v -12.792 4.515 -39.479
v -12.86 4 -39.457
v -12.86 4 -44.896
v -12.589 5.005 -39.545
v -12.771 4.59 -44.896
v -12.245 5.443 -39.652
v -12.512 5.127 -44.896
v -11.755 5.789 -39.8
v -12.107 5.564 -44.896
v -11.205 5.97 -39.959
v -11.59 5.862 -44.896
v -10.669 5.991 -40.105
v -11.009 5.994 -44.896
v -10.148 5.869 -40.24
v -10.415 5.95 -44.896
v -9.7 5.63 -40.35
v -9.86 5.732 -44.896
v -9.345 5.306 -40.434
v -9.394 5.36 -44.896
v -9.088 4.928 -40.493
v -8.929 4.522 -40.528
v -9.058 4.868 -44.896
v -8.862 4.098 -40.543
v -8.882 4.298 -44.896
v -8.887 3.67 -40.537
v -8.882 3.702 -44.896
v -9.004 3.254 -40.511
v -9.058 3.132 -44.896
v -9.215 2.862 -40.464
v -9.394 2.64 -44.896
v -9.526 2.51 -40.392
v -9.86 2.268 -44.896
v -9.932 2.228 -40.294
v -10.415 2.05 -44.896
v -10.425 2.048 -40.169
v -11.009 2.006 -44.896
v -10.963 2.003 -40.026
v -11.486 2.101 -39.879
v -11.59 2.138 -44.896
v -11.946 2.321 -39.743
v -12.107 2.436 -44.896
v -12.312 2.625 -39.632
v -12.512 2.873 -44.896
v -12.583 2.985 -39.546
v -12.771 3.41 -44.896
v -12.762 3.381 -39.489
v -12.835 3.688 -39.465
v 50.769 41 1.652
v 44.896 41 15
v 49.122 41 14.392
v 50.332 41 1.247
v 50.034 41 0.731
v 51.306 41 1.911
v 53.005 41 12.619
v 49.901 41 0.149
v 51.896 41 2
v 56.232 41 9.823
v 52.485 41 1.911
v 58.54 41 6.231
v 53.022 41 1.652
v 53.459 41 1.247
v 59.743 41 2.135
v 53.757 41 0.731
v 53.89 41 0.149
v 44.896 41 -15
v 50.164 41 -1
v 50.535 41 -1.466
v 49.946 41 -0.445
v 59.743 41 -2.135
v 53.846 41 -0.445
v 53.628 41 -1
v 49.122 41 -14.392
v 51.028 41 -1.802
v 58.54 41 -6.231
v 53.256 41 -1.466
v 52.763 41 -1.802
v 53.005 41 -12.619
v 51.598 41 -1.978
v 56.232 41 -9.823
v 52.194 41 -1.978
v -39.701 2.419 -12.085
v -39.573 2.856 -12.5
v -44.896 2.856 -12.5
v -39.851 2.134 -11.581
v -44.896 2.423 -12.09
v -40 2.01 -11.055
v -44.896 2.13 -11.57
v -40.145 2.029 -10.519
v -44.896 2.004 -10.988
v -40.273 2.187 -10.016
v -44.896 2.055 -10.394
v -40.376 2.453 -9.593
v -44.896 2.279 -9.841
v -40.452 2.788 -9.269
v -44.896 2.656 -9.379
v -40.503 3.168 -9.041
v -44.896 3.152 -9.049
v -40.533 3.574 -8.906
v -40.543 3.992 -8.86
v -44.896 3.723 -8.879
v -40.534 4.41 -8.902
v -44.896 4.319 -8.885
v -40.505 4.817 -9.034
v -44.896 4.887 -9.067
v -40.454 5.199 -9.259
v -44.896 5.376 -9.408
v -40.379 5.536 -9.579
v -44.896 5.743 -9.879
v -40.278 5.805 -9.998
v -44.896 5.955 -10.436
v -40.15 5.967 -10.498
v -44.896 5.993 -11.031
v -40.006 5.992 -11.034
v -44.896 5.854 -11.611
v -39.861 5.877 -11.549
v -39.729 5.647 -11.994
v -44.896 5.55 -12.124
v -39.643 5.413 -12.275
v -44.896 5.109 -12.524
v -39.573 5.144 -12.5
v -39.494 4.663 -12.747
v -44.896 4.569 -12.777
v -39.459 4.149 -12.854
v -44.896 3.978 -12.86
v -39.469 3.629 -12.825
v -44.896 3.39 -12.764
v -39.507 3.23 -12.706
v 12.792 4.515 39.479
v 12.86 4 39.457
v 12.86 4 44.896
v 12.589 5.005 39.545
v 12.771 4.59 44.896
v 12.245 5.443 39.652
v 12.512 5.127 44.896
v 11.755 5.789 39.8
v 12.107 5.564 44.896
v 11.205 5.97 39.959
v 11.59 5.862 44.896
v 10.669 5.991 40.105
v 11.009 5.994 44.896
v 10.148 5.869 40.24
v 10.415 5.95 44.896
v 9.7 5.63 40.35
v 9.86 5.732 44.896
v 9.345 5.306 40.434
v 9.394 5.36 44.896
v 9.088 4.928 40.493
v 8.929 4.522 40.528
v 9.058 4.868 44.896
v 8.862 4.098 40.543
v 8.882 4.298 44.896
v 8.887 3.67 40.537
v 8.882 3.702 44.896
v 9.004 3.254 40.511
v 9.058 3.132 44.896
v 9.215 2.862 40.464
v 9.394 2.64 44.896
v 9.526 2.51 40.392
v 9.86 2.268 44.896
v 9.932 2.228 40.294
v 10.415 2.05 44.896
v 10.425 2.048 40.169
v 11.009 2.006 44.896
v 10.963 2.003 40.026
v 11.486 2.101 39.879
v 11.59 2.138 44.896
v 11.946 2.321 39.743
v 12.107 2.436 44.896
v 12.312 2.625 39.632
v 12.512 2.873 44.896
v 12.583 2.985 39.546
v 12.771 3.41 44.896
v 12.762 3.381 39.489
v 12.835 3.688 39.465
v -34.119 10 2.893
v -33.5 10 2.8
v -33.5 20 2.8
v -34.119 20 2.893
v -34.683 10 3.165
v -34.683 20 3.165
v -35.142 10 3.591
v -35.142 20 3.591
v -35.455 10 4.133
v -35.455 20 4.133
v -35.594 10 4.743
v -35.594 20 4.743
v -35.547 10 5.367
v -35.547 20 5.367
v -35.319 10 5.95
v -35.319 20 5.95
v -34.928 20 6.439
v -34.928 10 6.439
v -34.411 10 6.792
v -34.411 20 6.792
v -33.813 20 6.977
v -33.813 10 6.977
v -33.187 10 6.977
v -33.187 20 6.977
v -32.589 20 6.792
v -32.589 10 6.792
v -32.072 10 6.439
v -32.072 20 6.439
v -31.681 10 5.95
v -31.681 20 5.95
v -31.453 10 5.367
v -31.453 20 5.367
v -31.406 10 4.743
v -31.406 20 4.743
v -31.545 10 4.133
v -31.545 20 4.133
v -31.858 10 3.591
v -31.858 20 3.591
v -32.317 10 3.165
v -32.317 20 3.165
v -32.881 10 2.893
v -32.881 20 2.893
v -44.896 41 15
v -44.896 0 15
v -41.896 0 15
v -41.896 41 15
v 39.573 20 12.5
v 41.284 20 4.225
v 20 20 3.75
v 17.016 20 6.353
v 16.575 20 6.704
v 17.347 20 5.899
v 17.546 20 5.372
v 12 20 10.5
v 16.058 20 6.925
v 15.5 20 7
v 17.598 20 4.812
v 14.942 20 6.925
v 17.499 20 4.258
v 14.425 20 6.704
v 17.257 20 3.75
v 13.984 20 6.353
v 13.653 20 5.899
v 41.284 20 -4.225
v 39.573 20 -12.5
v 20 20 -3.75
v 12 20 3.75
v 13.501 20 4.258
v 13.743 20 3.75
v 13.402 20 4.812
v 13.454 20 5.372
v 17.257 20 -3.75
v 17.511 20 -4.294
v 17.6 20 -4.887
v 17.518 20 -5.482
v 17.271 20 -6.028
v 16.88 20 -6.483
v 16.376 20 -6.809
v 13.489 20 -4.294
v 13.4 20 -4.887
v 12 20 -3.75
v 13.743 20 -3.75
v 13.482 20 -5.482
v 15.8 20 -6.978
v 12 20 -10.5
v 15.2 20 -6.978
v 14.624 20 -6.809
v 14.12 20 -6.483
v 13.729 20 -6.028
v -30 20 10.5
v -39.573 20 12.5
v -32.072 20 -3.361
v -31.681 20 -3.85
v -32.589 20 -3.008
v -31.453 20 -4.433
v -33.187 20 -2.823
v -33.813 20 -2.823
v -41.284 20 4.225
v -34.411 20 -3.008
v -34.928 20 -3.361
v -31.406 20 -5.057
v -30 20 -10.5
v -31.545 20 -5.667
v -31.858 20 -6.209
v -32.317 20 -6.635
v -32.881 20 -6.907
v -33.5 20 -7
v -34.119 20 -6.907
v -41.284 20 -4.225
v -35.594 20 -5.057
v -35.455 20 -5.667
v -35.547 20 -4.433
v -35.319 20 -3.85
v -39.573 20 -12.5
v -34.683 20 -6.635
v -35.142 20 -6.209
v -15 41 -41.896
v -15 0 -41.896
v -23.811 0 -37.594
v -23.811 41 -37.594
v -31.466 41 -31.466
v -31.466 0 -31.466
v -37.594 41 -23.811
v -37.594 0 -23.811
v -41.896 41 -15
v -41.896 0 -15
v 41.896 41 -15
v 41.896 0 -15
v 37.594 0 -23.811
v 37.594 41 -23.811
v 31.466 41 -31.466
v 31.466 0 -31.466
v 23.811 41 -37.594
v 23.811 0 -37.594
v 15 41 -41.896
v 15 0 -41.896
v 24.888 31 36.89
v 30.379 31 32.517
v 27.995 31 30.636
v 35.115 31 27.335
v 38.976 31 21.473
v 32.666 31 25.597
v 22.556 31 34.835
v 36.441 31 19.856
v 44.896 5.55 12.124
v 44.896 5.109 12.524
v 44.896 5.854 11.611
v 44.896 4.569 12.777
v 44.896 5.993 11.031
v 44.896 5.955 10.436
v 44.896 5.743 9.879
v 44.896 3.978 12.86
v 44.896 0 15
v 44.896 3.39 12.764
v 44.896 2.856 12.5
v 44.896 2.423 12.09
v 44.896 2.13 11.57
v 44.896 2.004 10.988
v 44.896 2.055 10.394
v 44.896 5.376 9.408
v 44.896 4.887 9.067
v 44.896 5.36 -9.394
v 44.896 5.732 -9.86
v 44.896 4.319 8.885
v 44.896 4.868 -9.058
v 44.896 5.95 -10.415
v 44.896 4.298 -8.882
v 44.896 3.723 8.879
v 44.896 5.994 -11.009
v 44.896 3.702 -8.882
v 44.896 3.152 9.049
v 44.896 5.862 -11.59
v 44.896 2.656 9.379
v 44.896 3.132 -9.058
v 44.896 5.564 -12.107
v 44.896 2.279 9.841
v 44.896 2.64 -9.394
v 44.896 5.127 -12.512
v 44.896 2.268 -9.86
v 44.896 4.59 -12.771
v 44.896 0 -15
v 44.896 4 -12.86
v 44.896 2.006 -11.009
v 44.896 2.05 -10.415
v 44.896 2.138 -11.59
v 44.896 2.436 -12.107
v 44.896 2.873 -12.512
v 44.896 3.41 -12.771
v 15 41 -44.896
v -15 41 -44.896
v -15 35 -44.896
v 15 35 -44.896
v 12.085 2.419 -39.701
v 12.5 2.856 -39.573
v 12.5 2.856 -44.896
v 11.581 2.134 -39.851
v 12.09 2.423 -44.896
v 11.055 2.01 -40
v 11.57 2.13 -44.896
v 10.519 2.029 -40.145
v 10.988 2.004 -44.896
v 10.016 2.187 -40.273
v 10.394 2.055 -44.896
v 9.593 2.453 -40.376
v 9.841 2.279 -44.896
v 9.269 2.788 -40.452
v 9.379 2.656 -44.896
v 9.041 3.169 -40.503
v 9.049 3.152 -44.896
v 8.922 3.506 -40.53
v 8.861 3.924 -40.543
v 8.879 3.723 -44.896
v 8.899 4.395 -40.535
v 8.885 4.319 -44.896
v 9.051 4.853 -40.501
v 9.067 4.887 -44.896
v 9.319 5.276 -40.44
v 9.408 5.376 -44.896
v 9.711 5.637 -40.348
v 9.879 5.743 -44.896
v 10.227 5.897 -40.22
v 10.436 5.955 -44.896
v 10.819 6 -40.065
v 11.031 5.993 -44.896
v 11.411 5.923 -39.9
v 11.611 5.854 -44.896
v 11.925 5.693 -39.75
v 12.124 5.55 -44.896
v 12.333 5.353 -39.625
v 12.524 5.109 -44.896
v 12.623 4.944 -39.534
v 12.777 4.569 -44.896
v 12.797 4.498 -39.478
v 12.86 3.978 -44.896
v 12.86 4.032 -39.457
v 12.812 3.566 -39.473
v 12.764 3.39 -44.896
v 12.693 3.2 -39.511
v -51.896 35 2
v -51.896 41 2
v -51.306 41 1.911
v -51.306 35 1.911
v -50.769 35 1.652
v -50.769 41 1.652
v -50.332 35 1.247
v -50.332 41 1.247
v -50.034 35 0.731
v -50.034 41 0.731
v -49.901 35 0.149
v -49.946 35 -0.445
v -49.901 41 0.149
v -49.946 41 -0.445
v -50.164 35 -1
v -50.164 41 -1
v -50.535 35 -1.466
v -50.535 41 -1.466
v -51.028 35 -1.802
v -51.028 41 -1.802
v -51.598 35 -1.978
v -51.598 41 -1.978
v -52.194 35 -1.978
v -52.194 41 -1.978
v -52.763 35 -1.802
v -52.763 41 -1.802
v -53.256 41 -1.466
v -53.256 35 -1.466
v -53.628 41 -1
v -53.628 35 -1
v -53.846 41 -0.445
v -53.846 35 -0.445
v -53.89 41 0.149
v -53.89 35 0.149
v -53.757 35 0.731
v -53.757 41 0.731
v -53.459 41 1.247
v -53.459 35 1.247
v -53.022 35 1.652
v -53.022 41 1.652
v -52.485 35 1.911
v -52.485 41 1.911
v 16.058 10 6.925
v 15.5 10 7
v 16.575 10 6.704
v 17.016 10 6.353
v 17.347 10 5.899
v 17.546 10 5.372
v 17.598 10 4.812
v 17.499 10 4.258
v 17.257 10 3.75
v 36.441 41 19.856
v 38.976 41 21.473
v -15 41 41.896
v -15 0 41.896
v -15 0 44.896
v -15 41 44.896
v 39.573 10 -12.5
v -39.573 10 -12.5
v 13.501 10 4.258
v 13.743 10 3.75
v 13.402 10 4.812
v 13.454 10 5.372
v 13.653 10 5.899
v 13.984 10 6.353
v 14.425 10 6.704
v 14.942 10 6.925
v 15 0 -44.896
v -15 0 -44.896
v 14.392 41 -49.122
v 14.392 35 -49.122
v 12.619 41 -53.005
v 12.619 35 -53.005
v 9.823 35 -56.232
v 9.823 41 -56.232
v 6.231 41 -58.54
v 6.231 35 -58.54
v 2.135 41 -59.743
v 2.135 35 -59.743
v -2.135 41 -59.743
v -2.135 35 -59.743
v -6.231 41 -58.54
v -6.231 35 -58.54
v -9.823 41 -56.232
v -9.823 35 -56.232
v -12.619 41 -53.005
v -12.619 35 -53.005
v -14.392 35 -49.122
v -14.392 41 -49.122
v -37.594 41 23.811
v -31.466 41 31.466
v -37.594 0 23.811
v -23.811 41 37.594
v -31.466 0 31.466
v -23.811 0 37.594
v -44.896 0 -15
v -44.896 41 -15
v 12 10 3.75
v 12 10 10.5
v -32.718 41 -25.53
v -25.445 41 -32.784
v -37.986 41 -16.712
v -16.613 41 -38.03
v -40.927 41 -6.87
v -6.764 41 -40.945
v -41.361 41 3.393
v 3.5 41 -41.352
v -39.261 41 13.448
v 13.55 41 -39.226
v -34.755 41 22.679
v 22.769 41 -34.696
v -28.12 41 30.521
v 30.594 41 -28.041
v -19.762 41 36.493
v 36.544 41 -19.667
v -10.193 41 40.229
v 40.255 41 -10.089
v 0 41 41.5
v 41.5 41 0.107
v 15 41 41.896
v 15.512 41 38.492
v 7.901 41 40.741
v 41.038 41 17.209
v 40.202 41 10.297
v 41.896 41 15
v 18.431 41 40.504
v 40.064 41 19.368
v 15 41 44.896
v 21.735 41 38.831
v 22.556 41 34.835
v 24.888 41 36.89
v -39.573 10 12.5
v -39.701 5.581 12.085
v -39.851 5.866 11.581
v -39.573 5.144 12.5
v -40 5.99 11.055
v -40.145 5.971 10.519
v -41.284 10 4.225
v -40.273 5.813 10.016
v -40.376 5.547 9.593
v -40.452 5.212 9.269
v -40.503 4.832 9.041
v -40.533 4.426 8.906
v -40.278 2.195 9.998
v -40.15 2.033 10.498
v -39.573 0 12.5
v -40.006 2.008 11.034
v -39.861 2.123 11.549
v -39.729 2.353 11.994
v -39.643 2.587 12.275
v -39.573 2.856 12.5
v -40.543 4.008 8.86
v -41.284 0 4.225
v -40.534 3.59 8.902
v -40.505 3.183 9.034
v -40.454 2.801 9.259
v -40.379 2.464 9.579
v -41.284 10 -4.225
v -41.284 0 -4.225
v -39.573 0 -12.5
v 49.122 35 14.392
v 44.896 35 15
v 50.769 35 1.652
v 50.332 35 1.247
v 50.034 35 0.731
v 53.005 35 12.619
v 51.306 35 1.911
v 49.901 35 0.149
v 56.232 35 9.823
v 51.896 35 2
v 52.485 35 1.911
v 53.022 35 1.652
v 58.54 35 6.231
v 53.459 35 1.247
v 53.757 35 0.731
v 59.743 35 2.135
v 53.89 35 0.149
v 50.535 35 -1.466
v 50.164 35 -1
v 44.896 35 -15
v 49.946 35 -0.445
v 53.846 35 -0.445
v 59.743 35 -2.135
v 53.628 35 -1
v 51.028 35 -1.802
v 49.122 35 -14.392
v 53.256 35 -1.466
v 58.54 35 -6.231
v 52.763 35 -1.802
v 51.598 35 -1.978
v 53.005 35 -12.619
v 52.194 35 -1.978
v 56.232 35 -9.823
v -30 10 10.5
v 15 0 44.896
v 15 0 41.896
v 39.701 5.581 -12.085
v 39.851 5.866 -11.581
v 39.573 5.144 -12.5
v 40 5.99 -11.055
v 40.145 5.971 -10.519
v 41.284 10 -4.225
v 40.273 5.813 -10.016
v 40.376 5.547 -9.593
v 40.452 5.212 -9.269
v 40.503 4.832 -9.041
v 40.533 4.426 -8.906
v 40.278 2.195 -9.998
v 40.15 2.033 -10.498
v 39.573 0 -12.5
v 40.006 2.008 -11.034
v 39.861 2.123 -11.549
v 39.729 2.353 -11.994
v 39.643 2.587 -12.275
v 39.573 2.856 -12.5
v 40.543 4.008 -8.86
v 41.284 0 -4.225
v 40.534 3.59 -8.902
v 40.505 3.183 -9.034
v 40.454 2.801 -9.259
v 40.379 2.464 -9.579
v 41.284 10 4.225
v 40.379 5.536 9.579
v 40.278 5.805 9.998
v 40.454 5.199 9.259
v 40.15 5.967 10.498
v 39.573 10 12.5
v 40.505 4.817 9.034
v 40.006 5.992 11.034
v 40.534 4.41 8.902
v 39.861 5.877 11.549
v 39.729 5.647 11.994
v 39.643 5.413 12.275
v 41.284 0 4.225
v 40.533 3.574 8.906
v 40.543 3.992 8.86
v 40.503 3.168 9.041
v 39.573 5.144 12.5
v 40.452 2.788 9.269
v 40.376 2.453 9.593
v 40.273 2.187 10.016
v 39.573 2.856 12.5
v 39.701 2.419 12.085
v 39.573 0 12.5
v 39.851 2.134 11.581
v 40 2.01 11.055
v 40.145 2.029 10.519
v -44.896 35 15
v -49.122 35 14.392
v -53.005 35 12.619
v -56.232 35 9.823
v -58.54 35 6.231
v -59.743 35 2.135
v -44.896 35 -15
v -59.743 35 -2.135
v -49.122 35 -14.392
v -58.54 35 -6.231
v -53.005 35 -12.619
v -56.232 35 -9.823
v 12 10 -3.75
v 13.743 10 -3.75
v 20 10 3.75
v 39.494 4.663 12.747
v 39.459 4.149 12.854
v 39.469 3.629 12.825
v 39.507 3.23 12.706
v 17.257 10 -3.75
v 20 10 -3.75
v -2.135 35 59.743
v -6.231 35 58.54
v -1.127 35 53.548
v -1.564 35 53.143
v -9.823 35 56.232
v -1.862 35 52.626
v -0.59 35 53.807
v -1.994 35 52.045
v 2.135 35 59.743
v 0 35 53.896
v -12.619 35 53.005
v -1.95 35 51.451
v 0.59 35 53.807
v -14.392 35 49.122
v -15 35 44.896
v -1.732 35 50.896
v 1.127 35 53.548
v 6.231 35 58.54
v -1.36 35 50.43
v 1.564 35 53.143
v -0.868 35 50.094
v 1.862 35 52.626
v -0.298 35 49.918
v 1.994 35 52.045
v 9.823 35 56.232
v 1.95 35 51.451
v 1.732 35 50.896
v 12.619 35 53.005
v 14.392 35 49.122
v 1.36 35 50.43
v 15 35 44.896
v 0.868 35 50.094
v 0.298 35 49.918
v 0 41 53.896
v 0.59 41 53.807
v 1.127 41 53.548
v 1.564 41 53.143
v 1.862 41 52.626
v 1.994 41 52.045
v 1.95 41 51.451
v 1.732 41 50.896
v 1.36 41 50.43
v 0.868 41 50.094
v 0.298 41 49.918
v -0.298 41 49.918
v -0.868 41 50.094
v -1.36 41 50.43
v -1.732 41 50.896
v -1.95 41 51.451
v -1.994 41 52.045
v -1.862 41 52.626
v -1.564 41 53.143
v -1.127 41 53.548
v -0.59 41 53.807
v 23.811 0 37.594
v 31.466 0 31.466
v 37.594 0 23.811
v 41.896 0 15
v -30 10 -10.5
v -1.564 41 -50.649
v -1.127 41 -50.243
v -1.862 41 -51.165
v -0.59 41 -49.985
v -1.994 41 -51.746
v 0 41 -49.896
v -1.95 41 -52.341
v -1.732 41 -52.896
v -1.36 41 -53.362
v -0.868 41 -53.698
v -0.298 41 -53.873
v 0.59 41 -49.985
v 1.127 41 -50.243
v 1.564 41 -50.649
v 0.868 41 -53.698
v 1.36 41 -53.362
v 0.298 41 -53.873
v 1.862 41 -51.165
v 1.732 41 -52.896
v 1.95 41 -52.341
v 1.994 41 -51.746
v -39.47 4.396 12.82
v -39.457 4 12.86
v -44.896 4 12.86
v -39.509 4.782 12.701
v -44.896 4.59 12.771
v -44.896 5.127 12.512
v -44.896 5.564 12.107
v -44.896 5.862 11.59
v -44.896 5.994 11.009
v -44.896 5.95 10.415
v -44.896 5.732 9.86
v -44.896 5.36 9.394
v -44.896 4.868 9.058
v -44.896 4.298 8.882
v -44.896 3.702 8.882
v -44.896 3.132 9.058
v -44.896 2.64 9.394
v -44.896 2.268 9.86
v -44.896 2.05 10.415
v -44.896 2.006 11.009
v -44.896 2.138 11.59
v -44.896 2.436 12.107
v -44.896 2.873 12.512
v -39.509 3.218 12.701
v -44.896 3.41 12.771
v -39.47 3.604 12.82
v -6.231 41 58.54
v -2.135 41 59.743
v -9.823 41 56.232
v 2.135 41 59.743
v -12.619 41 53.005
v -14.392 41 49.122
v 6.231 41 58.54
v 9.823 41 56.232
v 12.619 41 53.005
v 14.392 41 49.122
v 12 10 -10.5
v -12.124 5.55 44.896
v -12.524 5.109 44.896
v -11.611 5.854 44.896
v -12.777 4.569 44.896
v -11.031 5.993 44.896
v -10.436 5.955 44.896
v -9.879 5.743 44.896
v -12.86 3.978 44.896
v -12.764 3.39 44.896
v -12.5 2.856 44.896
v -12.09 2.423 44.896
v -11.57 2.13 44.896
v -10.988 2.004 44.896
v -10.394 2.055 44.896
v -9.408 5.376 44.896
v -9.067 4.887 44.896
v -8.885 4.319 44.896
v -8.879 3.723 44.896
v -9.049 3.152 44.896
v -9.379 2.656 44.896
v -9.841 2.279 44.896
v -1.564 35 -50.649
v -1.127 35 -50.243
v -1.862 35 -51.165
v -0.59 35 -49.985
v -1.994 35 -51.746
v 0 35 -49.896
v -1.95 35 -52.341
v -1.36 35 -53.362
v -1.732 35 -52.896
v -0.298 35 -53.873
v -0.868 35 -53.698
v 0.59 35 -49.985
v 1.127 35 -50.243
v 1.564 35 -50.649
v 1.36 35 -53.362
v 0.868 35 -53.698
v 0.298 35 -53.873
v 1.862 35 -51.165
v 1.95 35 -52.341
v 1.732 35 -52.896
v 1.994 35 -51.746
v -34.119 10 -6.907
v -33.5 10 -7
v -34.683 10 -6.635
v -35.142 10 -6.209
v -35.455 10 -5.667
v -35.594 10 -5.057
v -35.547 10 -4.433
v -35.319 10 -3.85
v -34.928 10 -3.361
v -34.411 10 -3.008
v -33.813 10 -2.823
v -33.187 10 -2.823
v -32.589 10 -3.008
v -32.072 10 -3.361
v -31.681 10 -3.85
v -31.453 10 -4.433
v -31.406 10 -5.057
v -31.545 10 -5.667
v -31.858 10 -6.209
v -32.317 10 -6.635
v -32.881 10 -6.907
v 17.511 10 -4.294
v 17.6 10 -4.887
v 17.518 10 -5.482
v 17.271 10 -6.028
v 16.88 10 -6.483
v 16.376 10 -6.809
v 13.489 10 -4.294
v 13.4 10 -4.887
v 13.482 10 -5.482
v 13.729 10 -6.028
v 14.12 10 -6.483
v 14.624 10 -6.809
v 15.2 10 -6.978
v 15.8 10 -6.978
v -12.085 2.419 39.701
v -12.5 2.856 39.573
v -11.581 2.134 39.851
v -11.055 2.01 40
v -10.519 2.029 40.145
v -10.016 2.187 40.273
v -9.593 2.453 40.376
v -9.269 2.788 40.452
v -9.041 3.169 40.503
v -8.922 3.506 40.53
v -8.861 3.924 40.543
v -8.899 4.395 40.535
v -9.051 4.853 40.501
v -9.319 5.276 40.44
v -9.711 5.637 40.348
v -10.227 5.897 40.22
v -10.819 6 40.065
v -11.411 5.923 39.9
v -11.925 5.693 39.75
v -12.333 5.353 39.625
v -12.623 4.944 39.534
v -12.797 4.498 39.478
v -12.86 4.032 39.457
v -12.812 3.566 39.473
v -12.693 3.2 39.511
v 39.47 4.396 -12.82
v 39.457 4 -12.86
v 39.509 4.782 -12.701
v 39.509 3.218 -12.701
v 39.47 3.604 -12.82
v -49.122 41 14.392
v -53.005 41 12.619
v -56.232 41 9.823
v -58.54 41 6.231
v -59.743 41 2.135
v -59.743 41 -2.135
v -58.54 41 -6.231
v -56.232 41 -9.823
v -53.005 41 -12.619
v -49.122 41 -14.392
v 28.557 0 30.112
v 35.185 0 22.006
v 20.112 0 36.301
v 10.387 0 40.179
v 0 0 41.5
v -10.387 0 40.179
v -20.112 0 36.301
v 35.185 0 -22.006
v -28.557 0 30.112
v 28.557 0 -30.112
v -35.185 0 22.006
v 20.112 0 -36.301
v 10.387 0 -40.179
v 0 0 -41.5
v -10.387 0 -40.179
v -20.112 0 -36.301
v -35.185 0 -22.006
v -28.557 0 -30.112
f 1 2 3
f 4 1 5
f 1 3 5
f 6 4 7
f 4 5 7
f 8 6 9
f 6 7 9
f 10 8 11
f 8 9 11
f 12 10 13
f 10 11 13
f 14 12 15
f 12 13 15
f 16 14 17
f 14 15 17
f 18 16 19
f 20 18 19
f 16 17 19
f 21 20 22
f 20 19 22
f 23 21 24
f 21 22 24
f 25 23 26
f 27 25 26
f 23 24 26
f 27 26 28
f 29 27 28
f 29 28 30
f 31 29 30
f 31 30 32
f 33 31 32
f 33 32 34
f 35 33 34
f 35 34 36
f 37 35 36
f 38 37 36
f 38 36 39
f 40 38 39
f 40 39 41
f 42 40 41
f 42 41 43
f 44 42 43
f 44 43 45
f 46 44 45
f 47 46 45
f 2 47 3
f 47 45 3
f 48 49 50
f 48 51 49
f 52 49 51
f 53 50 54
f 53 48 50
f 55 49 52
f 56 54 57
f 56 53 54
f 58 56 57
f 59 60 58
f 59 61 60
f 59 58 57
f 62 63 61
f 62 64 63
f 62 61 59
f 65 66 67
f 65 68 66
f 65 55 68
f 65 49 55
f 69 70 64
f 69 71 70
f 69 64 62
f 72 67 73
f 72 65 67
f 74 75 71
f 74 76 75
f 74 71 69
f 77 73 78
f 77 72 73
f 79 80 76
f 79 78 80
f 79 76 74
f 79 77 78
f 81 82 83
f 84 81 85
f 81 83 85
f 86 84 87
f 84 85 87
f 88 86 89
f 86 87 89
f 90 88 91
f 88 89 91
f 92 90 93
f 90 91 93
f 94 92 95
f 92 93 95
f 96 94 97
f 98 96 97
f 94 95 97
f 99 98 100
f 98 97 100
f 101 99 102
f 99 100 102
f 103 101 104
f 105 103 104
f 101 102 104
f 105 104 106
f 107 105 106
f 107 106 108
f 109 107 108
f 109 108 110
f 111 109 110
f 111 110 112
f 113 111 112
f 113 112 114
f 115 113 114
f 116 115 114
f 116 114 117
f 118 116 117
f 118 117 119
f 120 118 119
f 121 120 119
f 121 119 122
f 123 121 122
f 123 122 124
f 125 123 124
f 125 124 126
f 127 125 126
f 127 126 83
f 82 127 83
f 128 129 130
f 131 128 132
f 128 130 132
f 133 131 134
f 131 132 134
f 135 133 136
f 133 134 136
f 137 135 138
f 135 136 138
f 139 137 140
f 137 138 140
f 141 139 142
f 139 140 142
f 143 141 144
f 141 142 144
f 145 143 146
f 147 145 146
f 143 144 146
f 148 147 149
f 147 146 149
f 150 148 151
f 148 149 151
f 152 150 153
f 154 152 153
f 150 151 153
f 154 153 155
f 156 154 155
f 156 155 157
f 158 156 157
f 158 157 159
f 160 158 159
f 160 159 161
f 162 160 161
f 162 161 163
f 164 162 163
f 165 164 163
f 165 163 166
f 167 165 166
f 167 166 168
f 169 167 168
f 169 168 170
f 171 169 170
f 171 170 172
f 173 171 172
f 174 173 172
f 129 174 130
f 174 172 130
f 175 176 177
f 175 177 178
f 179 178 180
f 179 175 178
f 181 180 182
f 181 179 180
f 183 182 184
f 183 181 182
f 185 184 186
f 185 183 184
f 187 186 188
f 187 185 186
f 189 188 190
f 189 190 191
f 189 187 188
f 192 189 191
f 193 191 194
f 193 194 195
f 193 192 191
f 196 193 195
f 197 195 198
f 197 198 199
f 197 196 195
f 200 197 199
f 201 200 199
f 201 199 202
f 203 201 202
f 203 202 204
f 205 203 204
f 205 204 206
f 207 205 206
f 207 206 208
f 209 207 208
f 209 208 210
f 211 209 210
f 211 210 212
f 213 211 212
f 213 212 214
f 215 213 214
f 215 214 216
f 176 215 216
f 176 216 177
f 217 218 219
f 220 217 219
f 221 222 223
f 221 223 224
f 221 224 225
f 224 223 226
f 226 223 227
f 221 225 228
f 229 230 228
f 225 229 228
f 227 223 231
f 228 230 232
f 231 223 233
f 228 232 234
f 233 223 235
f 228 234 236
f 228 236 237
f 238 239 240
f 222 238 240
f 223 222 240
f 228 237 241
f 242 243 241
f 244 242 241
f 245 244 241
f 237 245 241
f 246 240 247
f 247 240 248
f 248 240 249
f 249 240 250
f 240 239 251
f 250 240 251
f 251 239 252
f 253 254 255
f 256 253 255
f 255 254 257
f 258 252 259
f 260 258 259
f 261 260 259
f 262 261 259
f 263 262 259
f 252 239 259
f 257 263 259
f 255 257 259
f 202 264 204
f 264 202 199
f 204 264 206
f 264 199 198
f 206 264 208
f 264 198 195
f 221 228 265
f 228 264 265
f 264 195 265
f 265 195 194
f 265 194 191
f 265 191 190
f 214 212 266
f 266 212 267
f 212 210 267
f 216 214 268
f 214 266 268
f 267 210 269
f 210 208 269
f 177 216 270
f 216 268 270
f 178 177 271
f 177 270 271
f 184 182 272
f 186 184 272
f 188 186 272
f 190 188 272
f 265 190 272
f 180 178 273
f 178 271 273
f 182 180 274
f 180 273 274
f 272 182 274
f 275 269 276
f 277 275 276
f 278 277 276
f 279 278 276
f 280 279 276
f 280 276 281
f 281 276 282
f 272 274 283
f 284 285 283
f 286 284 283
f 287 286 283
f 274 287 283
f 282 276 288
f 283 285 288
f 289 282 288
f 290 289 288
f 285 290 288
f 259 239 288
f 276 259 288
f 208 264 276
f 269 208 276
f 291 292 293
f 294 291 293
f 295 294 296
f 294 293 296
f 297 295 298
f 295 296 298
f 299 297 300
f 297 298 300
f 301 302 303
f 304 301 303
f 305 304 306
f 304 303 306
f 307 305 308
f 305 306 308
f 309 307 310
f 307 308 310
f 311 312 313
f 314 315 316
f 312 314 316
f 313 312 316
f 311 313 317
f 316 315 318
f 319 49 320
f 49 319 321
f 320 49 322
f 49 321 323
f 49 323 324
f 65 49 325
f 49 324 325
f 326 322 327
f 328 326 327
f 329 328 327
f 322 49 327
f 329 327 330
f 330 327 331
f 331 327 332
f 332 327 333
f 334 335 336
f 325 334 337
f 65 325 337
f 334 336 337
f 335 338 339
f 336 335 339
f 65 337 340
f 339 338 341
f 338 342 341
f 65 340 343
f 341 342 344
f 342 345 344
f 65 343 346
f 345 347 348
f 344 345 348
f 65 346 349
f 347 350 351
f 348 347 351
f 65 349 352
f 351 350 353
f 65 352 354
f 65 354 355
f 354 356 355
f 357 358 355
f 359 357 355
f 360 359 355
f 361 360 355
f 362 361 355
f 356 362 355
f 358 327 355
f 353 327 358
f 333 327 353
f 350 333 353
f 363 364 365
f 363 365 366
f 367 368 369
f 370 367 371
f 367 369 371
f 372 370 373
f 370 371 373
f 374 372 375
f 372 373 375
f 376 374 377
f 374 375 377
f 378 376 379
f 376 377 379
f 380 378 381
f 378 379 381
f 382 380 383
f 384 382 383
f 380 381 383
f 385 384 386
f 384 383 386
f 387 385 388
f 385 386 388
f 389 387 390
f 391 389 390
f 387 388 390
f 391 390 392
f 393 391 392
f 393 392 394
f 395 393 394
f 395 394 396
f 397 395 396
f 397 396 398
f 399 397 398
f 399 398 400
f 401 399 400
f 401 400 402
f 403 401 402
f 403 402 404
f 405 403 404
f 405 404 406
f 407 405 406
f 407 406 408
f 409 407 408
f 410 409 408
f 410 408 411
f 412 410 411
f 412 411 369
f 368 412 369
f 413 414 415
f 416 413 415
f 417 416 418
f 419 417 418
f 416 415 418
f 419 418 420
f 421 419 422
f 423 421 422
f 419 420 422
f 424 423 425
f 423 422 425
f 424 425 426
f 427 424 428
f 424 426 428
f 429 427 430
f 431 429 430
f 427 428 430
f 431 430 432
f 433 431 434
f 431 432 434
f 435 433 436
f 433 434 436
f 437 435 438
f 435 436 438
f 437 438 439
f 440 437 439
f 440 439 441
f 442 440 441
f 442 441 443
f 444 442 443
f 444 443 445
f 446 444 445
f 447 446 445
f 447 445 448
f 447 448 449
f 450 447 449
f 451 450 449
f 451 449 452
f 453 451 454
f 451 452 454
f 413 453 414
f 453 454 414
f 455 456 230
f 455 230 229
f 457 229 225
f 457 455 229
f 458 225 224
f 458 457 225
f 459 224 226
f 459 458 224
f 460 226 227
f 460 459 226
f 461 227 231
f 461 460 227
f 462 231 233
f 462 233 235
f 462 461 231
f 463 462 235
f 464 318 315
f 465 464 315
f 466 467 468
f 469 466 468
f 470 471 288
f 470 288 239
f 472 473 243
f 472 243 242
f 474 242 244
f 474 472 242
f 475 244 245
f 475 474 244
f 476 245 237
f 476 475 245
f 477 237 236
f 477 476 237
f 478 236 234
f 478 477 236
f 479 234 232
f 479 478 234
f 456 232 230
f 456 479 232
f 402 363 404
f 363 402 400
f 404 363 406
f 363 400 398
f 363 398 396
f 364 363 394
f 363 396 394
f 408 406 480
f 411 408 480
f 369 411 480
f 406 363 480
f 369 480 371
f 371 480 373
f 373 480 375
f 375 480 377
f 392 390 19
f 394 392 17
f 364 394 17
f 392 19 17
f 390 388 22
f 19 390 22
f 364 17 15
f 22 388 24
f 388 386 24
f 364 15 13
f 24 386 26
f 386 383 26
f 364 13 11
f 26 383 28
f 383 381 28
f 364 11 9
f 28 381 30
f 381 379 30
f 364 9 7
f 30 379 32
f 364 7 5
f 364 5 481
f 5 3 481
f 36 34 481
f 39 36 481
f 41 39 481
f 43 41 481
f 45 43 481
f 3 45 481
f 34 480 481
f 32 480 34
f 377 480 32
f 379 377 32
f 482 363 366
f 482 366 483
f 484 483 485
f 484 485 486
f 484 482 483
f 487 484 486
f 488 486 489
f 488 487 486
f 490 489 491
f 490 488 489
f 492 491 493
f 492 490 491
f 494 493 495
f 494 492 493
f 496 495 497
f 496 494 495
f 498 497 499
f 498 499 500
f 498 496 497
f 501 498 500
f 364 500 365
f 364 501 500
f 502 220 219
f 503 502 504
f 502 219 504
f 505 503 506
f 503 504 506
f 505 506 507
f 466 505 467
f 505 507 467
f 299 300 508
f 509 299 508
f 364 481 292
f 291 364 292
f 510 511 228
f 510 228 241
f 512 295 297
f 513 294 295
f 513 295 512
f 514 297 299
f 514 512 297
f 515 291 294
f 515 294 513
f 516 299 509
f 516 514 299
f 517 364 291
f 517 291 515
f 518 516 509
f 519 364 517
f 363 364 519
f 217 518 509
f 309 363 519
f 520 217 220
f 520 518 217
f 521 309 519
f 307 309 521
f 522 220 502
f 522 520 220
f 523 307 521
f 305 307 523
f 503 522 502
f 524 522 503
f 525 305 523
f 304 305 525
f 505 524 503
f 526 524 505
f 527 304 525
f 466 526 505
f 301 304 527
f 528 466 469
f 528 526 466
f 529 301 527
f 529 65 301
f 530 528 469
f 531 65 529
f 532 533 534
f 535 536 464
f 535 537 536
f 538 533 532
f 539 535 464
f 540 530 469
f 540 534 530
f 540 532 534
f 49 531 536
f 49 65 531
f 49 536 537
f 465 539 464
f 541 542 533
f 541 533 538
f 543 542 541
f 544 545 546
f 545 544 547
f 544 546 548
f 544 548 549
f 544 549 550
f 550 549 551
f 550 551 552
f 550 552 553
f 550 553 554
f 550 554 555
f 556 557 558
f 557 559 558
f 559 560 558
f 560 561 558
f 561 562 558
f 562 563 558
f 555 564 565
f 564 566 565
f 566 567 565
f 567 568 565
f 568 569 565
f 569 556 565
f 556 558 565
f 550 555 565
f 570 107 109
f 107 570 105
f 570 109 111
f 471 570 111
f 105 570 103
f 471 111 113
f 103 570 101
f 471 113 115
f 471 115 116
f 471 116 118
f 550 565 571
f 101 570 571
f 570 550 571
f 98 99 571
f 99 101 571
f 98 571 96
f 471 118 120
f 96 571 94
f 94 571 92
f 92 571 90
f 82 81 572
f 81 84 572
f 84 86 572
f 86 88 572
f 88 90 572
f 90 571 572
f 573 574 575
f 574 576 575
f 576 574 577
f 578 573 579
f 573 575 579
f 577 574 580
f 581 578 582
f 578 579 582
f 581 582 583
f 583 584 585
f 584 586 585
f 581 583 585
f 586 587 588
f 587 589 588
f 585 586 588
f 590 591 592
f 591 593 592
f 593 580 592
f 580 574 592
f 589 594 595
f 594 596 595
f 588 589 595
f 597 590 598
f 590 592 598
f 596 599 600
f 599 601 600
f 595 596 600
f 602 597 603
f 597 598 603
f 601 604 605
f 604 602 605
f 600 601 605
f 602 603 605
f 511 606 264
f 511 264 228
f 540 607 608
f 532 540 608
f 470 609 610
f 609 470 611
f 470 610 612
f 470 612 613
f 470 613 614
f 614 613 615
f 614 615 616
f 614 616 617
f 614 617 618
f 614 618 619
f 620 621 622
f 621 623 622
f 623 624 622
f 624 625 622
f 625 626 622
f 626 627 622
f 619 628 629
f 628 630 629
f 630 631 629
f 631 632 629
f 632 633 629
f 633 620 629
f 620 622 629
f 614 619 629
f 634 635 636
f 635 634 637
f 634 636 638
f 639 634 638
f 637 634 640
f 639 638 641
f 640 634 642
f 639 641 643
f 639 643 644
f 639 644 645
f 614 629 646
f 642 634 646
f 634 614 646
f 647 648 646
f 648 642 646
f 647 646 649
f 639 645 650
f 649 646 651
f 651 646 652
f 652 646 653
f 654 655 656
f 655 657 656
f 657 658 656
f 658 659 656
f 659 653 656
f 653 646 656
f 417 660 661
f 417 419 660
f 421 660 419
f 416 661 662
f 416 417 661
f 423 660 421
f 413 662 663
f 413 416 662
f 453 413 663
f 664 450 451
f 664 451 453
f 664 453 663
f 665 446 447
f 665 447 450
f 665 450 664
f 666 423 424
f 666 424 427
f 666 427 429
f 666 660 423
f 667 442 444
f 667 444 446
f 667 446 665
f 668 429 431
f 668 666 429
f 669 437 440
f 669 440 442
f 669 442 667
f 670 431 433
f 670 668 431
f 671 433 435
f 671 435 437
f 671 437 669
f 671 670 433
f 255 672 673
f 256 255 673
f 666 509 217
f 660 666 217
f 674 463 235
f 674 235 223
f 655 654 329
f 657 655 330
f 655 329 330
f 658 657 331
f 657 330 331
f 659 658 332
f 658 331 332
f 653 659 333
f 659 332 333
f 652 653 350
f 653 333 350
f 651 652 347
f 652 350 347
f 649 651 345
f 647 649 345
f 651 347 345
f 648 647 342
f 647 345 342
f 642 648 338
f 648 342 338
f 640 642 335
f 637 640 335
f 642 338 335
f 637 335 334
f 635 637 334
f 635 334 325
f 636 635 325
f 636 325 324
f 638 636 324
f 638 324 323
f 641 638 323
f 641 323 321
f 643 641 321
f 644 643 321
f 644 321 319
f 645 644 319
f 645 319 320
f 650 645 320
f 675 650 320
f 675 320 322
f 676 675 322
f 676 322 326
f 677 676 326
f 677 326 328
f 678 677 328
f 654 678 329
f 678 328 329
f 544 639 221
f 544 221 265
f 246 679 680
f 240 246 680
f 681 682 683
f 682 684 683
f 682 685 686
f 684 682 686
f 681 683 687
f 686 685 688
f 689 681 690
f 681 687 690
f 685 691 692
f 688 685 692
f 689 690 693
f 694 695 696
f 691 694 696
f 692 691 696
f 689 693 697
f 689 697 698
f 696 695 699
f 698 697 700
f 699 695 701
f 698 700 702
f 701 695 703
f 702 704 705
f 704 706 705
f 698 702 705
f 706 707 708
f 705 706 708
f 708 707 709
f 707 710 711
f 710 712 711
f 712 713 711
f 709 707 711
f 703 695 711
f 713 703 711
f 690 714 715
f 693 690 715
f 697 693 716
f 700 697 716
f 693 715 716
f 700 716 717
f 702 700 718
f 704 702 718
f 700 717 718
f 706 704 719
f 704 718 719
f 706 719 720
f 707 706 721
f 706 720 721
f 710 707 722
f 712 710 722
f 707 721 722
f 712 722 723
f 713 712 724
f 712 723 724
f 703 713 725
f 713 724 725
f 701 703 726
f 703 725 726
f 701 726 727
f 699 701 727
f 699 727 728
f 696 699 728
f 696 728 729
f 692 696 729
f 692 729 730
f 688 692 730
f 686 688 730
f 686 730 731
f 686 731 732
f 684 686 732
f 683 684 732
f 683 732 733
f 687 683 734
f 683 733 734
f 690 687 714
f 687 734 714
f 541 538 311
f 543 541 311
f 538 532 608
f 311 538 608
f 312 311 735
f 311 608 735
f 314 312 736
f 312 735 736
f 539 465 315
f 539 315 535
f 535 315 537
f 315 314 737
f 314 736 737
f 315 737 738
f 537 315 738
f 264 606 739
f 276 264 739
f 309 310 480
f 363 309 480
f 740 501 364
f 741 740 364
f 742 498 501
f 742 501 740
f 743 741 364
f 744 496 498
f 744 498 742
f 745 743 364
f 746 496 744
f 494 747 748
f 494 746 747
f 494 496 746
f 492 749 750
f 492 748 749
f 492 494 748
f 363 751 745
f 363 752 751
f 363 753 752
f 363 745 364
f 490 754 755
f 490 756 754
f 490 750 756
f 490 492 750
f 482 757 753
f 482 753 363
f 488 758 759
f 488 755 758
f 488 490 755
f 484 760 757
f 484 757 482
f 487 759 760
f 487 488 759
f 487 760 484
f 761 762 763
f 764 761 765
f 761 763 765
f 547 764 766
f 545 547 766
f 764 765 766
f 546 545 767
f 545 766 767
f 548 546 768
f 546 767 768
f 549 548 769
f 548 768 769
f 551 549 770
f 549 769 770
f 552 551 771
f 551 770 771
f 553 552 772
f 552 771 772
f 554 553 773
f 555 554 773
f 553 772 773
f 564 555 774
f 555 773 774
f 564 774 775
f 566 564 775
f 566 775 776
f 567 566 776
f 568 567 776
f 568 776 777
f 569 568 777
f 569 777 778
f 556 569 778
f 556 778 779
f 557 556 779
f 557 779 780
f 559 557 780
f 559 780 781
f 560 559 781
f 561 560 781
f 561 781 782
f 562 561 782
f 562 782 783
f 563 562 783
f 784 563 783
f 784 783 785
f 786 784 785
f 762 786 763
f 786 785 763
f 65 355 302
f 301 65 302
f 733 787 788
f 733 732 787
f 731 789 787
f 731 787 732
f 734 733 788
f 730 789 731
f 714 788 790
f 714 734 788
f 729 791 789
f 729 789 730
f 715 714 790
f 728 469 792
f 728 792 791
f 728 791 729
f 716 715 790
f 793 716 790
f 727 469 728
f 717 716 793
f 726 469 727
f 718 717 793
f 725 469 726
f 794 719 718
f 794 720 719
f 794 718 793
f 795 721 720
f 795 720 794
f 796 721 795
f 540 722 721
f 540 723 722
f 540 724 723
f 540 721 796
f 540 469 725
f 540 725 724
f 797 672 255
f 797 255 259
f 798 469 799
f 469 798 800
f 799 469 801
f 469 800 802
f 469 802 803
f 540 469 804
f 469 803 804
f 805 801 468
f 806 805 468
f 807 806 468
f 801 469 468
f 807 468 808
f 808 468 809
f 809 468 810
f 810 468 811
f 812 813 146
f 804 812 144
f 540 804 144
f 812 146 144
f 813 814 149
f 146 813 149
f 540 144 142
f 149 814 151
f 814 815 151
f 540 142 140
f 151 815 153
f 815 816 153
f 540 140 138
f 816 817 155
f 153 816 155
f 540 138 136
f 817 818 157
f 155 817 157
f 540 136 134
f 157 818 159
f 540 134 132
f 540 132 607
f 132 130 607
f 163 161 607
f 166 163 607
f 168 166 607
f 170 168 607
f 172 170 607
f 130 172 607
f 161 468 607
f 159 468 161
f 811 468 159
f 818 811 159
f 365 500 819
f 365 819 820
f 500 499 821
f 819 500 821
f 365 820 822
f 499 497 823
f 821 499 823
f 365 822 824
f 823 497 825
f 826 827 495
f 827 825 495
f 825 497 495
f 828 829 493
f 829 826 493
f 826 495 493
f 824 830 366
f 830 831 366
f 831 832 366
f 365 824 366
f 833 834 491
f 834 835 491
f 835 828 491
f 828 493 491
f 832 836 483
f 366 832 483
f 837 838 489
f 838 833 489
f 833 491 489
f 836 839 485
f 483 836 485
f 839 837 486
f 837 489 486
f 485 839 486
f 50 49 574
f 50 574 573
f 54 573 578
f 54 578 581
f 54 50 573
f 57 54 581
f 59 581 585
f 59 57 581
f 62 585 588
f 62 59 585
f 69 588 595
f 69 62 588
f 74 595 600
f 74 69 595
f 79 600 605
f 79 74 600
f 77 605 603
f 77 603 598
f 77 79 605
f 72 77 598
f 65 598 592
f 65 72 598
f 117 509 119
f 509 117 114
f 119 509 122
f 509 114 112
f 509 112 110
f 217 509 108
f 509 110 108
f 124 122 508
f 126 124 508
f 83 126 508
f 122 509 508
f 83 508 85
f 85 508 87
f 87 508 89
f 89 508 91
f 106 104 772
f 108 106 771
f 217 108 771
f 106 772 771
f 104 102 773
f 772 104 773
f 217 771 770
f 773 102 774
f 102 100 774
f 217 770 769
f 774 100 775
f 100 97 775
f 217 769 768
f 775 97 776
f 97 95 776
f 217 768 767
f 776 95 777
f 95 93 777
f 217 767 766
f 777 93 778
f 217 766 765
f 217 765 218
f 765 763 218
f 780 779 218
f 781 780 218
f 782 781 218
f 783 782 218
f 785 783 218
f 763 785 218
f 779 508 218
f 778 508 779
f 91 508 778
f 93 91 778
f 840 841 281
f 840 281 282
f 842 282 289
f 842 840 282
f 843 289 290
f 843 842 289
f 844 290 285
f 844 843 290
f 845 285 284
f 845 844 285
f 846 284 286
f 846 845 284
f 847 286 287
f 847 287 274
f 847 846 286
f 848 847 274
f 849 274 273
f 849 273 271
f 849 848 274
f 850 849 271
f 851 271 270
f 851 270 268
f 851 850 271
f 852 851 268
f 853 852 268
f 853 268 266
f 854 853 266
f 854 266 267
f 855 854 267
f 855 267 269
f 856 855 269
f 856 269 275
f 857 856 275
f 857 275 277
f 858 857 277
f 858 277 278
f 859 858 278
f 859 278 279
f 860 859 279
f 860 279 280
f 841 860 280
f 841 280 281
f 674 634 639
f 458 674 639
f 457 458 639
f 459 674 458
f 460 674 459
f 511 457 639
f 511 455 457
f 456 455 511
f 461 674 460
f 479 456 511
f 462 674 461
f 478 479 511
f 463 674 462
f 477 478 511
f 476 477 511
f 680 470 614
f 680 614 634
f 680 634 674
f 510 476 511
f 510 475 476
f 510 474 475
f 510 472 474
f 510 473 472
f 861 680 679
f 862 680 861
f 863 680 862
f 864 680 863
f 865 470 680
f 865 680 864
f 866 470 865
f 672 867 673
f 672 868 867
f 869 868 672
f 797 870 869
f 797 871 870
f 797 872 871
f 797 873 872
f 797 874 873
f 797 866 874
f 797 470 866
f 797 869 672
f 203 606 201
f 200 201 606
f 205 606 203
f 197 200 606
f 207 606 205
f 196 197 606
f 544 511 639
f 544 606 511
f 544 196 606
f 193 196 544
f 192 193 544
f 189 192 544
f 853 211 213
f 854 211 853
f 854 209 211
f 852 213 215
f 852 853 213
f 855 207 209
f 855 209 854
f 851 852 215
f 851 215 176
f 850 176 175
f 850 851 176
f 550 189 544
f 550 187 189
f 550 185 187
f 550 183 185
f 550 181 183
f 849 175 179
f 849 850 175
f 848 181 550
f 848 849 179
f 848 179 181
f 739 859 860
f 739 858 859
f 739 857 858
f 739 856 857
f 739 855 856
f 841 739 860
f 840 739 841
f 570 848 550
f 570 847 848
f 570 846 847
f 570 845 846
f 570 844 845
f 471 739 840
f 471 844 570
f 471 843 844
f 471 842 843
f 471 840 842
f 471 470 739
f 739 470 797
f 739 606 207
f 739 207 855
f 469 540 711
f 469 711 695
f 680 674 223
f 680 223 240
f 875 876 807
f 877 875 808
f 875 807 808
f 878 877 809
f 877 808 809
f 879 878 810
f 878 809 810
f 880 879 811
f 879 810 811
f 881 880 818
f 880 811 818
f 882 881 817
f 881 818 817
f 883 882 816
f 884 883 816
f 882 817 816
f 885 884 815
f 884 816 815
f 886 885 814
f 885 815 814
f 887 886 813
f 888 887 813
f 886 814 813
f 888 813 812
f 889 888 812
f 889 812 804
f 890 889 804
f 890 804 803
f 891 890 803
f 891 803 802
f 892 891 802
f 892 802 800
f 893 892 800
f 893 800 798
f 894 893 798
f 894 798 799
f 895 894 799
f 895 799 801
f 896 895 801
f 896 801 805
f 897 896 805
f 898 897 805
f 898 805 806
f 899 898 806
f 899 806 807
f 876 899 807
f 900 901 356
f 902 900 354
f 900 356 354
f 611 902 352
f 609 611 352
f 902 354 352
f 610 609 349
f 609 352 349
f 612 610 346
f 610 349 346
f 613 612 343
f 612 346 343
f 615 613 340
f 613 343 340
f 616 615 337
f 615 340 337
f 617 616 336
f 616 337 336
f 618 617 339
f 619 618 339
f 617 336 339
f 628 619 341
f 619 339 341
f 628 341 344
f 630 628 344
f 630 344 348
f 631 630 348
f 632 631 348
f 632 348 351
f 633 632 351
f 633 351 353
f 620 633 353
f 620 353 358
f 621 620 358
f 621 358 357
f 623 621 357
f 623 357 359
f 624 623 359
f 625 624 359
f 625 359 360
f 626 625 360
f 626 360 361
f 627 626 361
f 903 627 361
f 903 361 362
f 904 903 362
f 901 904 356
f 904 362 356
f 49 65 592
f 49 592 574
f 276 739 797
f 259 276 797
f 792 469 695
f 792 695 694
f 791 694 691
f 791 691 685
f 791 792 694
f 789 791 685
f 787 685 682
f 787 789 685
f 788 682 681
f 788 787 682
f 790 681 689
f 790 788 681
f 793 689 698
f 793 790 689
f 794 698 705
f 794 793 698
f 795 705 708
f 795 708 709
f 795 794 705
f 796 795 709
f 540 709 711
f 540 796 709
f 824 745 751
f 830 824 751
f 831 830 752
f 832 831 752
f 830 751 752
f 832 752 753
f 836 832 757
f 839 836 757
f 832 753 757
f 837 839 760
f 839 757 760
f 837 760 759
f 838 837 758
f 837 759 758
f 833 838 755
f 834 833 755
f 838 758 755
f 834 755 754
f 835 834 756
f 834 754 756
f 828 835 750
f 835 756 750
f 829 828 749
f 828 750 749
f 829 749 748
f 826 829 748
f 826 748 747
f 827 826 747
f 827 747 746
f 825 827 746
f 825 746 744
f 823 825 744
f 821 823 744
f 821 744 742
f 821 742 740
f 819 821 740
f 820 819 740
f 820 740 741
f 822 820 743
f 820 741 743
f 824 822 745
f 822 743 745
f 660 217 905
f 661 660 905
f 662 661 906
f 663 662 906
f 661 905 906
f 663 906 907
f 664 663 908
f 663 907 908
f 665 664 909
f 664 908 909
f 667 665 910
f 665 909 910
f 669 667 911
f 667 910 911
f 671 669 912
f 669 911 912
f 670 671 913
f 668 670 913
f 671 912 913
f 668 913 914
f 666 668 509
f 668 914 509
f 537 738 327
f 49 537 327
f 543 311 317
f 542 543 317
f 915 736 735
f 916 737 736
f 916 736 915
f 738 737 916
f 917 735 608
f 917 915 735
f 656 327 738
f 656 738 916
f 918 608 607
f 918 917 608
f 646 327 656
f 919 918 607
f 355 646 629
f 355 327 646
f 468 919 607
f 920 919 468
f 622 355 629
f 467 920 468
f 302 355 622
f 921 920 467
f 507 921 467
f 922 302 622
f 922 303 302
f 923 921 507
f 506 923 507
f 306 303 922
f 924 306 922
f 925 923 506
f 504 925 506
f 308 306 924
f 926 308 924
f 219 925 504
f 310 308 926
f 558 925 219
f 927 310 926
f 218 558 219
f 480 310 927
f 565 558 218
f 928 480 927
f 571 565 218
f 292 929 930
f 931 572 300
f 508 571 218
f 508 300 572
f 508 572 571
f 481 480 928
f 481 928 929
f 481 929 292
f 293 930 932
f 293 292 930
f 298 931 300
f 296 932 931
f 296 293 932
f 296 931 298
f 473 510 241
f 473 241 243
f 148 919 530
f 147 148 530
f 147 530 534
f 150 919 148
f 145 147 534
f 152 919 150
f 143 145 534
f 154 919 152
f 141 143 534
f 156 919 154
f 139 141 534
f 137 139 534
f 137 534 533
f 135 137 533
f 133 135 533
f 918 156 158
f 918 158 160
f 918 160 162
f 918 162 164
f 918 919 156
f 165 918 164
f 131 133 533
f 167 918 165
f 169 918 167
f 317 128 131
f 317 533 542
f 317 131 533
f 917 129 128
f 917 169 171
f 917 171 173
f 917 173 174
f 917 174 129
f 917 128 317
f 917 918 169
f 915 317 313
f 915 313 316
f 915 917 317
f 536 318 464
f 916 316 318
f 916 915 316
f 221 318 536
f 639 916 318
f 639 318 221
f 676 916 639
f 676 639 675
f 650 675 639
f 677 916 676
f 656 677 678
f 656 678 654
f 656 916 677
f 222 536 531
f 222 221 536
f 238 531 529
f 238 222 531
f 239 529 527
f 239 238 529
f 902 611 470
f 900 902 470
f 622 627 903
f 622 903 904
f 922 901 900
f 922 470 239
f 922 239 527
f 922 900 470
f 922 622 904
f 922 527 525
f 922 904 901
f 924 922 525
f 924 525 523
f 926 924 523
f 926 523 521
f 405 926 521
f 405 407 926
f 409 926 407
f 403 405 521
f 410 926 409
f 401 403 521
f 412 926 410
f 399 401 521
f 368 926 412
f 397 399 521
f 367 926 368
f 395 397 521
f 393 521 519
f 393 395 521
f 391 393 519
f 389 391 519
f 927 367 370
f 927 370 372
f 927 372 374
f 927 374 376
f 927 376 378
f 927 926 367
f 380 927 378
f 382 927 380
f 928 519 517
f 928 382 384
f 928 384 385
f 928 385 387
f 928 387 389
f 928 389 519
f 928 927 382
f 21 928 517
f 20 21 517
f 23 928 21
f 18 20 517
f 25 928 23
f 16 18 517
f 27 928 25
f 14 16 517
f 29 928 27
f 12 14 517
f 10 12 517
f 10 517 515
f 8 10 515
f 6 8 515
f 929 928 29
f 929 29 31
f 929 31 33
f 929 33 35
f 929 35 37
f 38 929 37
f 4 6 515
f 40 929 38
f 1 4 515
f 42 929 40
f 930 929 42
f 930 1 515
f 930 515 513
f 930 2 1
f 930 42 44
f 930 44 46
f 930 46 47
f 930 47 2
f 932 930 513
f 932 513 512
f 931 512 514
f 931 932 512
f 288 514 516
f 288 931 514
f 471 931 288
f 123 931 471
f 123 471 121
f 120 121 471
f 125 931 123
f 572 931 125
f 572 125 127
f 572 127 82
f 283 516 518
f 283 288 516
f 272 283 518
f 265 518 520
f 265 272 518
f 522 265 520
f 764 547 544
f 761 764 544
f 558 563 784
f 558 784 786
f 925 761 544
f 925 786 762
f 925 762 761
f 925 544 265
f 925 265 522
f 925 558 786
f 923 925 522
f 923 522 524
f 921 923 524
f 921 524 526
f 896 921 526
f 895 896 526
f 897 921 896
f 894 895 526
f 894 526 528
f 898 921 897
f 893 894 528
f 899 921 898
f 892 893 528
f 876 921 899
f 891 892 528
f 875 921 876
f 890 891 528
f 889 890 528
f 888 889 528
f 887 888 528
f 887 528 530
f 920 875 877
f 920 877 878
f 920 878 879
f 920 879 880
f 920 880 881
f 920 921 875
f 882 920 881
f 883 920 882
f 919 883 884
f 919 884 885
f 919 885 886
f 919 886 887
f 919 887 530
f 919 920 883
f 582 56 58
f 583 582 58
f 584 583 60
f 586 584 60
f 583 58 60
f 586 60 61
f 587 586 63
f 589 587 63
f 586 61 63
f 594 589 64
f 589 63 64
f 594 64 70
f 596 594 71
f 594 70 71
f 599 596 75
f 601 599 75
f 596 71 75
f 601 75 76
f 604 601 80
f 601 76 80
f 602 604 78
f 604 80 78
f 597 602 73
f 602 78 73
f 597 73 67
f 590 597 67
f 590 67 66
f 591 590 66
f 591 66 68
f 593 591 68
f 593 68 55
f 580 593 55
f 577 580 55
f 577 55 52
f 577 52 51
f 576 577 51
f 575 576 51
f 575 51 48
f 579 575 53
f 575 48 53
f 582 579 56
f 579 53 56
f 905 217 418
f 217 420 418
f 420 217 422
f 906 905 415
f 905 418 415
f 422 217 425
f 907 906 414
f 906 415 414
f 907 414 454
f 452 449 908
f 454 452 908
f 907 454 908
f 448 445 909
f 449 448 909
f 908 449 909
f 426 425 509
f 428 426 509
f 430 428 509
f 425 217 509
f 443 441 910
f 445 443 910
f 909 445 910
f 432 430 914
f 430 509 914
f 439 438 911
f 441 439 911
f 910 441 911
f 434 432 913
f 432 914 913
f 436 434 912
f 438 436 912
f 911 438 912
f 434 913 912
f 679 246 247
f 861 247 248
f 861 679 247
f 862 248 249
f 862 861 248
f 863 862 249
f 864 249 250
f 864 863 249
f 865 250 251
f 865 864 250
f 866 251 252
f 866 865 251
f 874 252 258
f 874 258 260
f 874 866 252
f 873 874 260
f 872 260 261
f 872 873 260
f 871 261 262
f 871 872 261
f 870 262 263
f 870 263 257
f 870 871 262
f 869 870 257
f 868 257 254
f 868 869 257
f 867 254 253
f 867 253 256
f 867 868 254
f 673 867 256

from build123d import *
from build123d.topology import SkipClean

# Parameters (mm, degrees)
SKETCH1_R             = 44.5
SKETCH1_R_2           = 41.5
BOSS_EXTRUDE1_DEPTH   = 41
SKETCH2_R             = 2.1
SKETCH2_W             = 42
SKETCH2_H             = 21
BOSS_EXTRUDE2_DEPTH   = 20
BOSS_EXTRUDE3_DEPTH   = 41
CIRPATTERN1_COUNT     = 4
SKETCH4_R             = 2
CUT_EXTRUDE1_DEPTH    = 7
CUT_EXTRUDE2_DEPTH    = 10
CIRPATTERN2_COUNT     = 4
SKETCH6_R             = 2
BOSS_EXTRUDE4_DEPTH   = 6
BOSS_EXTRUDE4_2_DEPTH = 6
BOSS_EXTRUDE4_3_DEPTH = 6
BOSS_EXTRUDE4_4_DEPTH = 6
SKETCH8_W             = 8
SKETCH8_H             = 7.5
CUT_EXTRUDE3_DEPTH    = 60
CUT_EXTRUDE4_START    = -10
CUT_EXTRUDE4_DEPTH    = 10


with BuildPart() as part:
    # Sketch1 → Boss-Extrude1 (new body)
    with BuildSketch(Plane(origin=(0, 0, 0), x_dir=(1, 0, 0), z_dir=(0, 1, 0))):
        with Locations(Location((0, 0, 0), (0, 0, 270))):
            Circle(SKETCH1_R)
        with Locations(Location((0, 0, 0), (0, 0, 270))):
            Circle(SKETCH1_R_2, mode=Mode.SUBTRACT)
    extrude(amount=BOSS_EXTRUDE1_DEPTH)

    # Sketch2 → Boss-Extrude2 (add)
    with BuildSketch(Plane(origin=(0, 0, 0), x_dir=(1, 0, 0), z_dir=(0, 1, 0))):
        with BuildLine():
            Line((-39.572717875, 12.5), (39.572717875, 12.5))
            ThreePointArc((39.572717875, 12.5), (41.658434963, 0), (39.572717875, -12.5))
            Line((39.572717875, -12.5), (-39.572717875, -12.5))
            ThreePointArc((-39.572717875, -12.5), (-41.658434963, 0), (-39.572717875, 12.5))
        make_face()
        with Locations(Location((15.5, 4.9, 0), (0, 0, 270))):
            Circle(SKETCH2_R, mode=Mode.SUBTRACT)
        with Locations(Location((15.5, -4.9, 0), (0, 0, 270))):
            Circle(SKETCH2_R, mode=Mode.SUBTRACT)
        with Locations(Location((-33.5, 4.9, 0), (0, 0, 90))):
            Circle(SKETCH2_R, mode=Mode.SUBTRACT)
        with Locations(Location((-33.5, -4.9, 0), (0, 0, 90))):
            Circle(SKETCH2_R, mode=Mode.SUBTRACT)
        with Locations((-9, 0)):
            Rectangle(SKETCH2_W, SKETCH2_H, mode=Mode.SUBTRACT)
    extrude(amount=BOSS_EXTRUDE2_DEPTH)

    # Sketch3 → Boss-Extrude3 (add)
    with BuildSketch(Plane(origin=(0, 0, 0), x_dir=(1, 0, 0), z_dir=(0, 1, 0))):
        with BuildLine():
            Line((0, 44.895703837), (-15, 44.895703837))
            Line((-15, 44.895703837), (-15, 41.895703837))
            ThreePointArc((-15, 41.895703837), (0, 44.5), (15, 41.895703837))
            Line((15, 41.895703837), (15, 44.895703837))
            Line((15, 44.895703837), (0, 44.895703837))
        make_face()
    boss_extrude3 = extrude(amount=BOSS_EXTRUDE3_DEPTH)

    # CirPattern1: Boss-Extrude3 ×4 about axis
    cirpattern1_axis = Axis((0, 0, 0), (0, 1, 0))
    for i in range(1, CIRPATTERN1_COUNT):
        add(boss_extrude3.rotate(cirpattern1_axis, i * 360 / CIRPATTERN1_COUNT))

    # Sketch4 → Cut-Extrude1 (cut)
    with BuildSketch(Plane.ZY.offset(44.895703837)):
        with Locations((10.859802344, 4)):
            Circle(SKETCH4_R)
        with Locations(Location((-10.859802344, 4, 0), (0, 0, 214.905312115))):
            Circle(SKETCH4_R)
    cut_extrude1 = extrude(amount=-CUT_EXTRUDE1_DEPTH, mode=Mode.SUBTRACT)

    # Sketch5 → Cut-Extrude2 (cut)
    with SkipClean():  # the faces are left unmerged after this step: merging them gives an invalid solid
        with BuildSketch(Plane(origin=(0, 0, 0), x_dir=(1, 0, 0), z_dir=(0, 1, 0))):
            with BuildLine():
                Line((-39.572717875, 12.5), (39.572717875, 12.5))
                ThreePointArc((39.572717875, 12.5), (41.5, 0), (39.572717875, -12.5))
                Line((39.572717875, -12.5), (-39.572717875, -12.5))
                ThreePointArc((-39.572717875, -12.5), (-41.5, 0), (-39.572717875, 12.5))
            make_face()
        extrude(amount=CUT_EXTRUDE2_DEPTH, mode=Mode.SUBTRACT)

    # CirPattern2: Cut-Extrude1 ×4 about axis
    with SkipClean():  # the faces are left unmerged after this step: merging them gives an invalid solid
        cirpattern2_axis = Axis((0, 41, 0), (0, -1, 0))
        for i in range(1, CIRPATTERN2_COUNT):
            add(cut_extrude1.rotate(cirpattern2_axis, i * 360 / CIRPATTERN2_COUNT), mode=Mode.SUBTRACT)

    # Sketch8 → Cut-Extrude3 (cut)
    with SkipClean():  # the faces are left unmerged after this step: merging them gives an invalid solid
        with BuildSketch(Plane(origin=(0, 0, 0), x_dir=(1, 0, 0), z_dir=(0, 1, 0))):
            with Locations((16, 0)):
                Rectangle(SKETCH8_W, SKETCH8_H)
        extrude(amount=CUT_EXTRUDE3_DEPTH, mode=Mode.SUBTRACT)

    # Sketch9 → Cut-Extrude4 (cut)
    with SkipClean():  # the faces are left unmerged after this step: merging them gives an invalid solid
        with BuildSketch(Plane(origin=(0, 41, 0), x_dir=(1, 0, 0), z_dir=(0, 1, 0)).offset(CUT_EXTRUDE4_START)):
            with BuildLine():
                Line((36.441495651, -19.856167674), (38.976205671, -21.473364699))
                ThreePointArc((38.976205671, -21.473364699), (32.849182071, -30.019680832), (24.887814069, -36.889655879))
                Line((24.887814069, -36.889655879), (22.556482536, -34.834682367))
                ThreePointArc((22.556482536, -34.834682367), (30.434837492, -28.212952112), (36.441495651, -19.856167674))
            make_face()
        extrude(amount=CUT_EXTRUDE4_DEPTH, mode=Mode.SUBTRACT)


with BuildPart() as body_2:
    # Sketch6 → Boss-Extrude4 (new body)
    with BuildSketch(Plane(origin=(0, 41, 0), x_dir=(1, 0, 0), z_dir=(0, 1, 0))):
        with BuildLine():
            Line((-44.895703837, 15), (-44.895703837, -15))
            ThreePointArc((-44.895703837, -15), (-59.895703837, 0), (-44.895703837, 15))
        make_face()
        with Locations(Location((-51.895703837, 0, 0), (0, 0, 270))):
            Circle(SKETCH6_R, mode=Mode.SUBTRACT)
    extrude(amount=-BOSS_EXTRUDE4_DEPTH)


with BuildPart() as body_3:
    # Sketch6 → Boss-Extrude4 2 (new body)
    with BuildSketch(Plane(origin=(0, 41, 0), x_dir=(1, 0, 0), z_dir=(0, 1, 0))):
        with BuildLine():
            Line((-15, 44.895703837), (15, 44.895703837))
            ThreePointArc((15, 44.895703837), (0, 59.895703837), (-15, 44.895703837))
        make_face()
        with Locations(Location((0, 51.895703837, 0), (0, 0, 270))):
            Circle(SKETCH6_R, mode=Mode.SUBTRACT)
    extrude(amount=-BOSS_EXTRUDE4_2_DEPTH)


with BuildPart() as body_4:
    # Sketch6 → Boss-Extrude4 3 (new body)
    with BuildSketch(Plane(origin=(0, 41, 0), x_dir=(1, 0, 0), z_dir=(0, 1, 0))):
        with BuildLine():
            Line((44.895703837, 15), (44.895703837, -15))
            ThreePointArc((44.895703837, -15), (59.895703837, 0), (44.895703837, 15))
        make_face()
        with Locations(Location((51.895703837, 0, 0), (0, 0, 270))):
            Circle(SKETCH6_R, mode=Mode.SUBTRACT)
    extrude(amount=-BOSS_EXTRUDE4_3_DEPTH)


with BuildPart() as body_5:
    # Sketch6 → Boss-Extrude4 4 (new body)
    with BuildSketch(Plane(origin=(0, 41, 0), x_dir=(1, 0, 0), z_dir=(0, 1, 0))):
        with BuildLine():
            Line((15, -44.895703837), (-15, -44.895703837))
            ThreePointArc((-15, -44.895703837), (0, -59.895703837), (15, -44.895703837))
        make_face()
        with Locations(Location((0, -51.895703837, 0), (0, 0, 270))):
            Circle(SKETCH6_R, mode=Mode.SUBTRACT)
    extrude(amount=-BOSS_EXTRUDE4_4_DEPTH)


solid = Compound([part.part, body_2.part, body_3.part, body_4.part, body_5.part])
